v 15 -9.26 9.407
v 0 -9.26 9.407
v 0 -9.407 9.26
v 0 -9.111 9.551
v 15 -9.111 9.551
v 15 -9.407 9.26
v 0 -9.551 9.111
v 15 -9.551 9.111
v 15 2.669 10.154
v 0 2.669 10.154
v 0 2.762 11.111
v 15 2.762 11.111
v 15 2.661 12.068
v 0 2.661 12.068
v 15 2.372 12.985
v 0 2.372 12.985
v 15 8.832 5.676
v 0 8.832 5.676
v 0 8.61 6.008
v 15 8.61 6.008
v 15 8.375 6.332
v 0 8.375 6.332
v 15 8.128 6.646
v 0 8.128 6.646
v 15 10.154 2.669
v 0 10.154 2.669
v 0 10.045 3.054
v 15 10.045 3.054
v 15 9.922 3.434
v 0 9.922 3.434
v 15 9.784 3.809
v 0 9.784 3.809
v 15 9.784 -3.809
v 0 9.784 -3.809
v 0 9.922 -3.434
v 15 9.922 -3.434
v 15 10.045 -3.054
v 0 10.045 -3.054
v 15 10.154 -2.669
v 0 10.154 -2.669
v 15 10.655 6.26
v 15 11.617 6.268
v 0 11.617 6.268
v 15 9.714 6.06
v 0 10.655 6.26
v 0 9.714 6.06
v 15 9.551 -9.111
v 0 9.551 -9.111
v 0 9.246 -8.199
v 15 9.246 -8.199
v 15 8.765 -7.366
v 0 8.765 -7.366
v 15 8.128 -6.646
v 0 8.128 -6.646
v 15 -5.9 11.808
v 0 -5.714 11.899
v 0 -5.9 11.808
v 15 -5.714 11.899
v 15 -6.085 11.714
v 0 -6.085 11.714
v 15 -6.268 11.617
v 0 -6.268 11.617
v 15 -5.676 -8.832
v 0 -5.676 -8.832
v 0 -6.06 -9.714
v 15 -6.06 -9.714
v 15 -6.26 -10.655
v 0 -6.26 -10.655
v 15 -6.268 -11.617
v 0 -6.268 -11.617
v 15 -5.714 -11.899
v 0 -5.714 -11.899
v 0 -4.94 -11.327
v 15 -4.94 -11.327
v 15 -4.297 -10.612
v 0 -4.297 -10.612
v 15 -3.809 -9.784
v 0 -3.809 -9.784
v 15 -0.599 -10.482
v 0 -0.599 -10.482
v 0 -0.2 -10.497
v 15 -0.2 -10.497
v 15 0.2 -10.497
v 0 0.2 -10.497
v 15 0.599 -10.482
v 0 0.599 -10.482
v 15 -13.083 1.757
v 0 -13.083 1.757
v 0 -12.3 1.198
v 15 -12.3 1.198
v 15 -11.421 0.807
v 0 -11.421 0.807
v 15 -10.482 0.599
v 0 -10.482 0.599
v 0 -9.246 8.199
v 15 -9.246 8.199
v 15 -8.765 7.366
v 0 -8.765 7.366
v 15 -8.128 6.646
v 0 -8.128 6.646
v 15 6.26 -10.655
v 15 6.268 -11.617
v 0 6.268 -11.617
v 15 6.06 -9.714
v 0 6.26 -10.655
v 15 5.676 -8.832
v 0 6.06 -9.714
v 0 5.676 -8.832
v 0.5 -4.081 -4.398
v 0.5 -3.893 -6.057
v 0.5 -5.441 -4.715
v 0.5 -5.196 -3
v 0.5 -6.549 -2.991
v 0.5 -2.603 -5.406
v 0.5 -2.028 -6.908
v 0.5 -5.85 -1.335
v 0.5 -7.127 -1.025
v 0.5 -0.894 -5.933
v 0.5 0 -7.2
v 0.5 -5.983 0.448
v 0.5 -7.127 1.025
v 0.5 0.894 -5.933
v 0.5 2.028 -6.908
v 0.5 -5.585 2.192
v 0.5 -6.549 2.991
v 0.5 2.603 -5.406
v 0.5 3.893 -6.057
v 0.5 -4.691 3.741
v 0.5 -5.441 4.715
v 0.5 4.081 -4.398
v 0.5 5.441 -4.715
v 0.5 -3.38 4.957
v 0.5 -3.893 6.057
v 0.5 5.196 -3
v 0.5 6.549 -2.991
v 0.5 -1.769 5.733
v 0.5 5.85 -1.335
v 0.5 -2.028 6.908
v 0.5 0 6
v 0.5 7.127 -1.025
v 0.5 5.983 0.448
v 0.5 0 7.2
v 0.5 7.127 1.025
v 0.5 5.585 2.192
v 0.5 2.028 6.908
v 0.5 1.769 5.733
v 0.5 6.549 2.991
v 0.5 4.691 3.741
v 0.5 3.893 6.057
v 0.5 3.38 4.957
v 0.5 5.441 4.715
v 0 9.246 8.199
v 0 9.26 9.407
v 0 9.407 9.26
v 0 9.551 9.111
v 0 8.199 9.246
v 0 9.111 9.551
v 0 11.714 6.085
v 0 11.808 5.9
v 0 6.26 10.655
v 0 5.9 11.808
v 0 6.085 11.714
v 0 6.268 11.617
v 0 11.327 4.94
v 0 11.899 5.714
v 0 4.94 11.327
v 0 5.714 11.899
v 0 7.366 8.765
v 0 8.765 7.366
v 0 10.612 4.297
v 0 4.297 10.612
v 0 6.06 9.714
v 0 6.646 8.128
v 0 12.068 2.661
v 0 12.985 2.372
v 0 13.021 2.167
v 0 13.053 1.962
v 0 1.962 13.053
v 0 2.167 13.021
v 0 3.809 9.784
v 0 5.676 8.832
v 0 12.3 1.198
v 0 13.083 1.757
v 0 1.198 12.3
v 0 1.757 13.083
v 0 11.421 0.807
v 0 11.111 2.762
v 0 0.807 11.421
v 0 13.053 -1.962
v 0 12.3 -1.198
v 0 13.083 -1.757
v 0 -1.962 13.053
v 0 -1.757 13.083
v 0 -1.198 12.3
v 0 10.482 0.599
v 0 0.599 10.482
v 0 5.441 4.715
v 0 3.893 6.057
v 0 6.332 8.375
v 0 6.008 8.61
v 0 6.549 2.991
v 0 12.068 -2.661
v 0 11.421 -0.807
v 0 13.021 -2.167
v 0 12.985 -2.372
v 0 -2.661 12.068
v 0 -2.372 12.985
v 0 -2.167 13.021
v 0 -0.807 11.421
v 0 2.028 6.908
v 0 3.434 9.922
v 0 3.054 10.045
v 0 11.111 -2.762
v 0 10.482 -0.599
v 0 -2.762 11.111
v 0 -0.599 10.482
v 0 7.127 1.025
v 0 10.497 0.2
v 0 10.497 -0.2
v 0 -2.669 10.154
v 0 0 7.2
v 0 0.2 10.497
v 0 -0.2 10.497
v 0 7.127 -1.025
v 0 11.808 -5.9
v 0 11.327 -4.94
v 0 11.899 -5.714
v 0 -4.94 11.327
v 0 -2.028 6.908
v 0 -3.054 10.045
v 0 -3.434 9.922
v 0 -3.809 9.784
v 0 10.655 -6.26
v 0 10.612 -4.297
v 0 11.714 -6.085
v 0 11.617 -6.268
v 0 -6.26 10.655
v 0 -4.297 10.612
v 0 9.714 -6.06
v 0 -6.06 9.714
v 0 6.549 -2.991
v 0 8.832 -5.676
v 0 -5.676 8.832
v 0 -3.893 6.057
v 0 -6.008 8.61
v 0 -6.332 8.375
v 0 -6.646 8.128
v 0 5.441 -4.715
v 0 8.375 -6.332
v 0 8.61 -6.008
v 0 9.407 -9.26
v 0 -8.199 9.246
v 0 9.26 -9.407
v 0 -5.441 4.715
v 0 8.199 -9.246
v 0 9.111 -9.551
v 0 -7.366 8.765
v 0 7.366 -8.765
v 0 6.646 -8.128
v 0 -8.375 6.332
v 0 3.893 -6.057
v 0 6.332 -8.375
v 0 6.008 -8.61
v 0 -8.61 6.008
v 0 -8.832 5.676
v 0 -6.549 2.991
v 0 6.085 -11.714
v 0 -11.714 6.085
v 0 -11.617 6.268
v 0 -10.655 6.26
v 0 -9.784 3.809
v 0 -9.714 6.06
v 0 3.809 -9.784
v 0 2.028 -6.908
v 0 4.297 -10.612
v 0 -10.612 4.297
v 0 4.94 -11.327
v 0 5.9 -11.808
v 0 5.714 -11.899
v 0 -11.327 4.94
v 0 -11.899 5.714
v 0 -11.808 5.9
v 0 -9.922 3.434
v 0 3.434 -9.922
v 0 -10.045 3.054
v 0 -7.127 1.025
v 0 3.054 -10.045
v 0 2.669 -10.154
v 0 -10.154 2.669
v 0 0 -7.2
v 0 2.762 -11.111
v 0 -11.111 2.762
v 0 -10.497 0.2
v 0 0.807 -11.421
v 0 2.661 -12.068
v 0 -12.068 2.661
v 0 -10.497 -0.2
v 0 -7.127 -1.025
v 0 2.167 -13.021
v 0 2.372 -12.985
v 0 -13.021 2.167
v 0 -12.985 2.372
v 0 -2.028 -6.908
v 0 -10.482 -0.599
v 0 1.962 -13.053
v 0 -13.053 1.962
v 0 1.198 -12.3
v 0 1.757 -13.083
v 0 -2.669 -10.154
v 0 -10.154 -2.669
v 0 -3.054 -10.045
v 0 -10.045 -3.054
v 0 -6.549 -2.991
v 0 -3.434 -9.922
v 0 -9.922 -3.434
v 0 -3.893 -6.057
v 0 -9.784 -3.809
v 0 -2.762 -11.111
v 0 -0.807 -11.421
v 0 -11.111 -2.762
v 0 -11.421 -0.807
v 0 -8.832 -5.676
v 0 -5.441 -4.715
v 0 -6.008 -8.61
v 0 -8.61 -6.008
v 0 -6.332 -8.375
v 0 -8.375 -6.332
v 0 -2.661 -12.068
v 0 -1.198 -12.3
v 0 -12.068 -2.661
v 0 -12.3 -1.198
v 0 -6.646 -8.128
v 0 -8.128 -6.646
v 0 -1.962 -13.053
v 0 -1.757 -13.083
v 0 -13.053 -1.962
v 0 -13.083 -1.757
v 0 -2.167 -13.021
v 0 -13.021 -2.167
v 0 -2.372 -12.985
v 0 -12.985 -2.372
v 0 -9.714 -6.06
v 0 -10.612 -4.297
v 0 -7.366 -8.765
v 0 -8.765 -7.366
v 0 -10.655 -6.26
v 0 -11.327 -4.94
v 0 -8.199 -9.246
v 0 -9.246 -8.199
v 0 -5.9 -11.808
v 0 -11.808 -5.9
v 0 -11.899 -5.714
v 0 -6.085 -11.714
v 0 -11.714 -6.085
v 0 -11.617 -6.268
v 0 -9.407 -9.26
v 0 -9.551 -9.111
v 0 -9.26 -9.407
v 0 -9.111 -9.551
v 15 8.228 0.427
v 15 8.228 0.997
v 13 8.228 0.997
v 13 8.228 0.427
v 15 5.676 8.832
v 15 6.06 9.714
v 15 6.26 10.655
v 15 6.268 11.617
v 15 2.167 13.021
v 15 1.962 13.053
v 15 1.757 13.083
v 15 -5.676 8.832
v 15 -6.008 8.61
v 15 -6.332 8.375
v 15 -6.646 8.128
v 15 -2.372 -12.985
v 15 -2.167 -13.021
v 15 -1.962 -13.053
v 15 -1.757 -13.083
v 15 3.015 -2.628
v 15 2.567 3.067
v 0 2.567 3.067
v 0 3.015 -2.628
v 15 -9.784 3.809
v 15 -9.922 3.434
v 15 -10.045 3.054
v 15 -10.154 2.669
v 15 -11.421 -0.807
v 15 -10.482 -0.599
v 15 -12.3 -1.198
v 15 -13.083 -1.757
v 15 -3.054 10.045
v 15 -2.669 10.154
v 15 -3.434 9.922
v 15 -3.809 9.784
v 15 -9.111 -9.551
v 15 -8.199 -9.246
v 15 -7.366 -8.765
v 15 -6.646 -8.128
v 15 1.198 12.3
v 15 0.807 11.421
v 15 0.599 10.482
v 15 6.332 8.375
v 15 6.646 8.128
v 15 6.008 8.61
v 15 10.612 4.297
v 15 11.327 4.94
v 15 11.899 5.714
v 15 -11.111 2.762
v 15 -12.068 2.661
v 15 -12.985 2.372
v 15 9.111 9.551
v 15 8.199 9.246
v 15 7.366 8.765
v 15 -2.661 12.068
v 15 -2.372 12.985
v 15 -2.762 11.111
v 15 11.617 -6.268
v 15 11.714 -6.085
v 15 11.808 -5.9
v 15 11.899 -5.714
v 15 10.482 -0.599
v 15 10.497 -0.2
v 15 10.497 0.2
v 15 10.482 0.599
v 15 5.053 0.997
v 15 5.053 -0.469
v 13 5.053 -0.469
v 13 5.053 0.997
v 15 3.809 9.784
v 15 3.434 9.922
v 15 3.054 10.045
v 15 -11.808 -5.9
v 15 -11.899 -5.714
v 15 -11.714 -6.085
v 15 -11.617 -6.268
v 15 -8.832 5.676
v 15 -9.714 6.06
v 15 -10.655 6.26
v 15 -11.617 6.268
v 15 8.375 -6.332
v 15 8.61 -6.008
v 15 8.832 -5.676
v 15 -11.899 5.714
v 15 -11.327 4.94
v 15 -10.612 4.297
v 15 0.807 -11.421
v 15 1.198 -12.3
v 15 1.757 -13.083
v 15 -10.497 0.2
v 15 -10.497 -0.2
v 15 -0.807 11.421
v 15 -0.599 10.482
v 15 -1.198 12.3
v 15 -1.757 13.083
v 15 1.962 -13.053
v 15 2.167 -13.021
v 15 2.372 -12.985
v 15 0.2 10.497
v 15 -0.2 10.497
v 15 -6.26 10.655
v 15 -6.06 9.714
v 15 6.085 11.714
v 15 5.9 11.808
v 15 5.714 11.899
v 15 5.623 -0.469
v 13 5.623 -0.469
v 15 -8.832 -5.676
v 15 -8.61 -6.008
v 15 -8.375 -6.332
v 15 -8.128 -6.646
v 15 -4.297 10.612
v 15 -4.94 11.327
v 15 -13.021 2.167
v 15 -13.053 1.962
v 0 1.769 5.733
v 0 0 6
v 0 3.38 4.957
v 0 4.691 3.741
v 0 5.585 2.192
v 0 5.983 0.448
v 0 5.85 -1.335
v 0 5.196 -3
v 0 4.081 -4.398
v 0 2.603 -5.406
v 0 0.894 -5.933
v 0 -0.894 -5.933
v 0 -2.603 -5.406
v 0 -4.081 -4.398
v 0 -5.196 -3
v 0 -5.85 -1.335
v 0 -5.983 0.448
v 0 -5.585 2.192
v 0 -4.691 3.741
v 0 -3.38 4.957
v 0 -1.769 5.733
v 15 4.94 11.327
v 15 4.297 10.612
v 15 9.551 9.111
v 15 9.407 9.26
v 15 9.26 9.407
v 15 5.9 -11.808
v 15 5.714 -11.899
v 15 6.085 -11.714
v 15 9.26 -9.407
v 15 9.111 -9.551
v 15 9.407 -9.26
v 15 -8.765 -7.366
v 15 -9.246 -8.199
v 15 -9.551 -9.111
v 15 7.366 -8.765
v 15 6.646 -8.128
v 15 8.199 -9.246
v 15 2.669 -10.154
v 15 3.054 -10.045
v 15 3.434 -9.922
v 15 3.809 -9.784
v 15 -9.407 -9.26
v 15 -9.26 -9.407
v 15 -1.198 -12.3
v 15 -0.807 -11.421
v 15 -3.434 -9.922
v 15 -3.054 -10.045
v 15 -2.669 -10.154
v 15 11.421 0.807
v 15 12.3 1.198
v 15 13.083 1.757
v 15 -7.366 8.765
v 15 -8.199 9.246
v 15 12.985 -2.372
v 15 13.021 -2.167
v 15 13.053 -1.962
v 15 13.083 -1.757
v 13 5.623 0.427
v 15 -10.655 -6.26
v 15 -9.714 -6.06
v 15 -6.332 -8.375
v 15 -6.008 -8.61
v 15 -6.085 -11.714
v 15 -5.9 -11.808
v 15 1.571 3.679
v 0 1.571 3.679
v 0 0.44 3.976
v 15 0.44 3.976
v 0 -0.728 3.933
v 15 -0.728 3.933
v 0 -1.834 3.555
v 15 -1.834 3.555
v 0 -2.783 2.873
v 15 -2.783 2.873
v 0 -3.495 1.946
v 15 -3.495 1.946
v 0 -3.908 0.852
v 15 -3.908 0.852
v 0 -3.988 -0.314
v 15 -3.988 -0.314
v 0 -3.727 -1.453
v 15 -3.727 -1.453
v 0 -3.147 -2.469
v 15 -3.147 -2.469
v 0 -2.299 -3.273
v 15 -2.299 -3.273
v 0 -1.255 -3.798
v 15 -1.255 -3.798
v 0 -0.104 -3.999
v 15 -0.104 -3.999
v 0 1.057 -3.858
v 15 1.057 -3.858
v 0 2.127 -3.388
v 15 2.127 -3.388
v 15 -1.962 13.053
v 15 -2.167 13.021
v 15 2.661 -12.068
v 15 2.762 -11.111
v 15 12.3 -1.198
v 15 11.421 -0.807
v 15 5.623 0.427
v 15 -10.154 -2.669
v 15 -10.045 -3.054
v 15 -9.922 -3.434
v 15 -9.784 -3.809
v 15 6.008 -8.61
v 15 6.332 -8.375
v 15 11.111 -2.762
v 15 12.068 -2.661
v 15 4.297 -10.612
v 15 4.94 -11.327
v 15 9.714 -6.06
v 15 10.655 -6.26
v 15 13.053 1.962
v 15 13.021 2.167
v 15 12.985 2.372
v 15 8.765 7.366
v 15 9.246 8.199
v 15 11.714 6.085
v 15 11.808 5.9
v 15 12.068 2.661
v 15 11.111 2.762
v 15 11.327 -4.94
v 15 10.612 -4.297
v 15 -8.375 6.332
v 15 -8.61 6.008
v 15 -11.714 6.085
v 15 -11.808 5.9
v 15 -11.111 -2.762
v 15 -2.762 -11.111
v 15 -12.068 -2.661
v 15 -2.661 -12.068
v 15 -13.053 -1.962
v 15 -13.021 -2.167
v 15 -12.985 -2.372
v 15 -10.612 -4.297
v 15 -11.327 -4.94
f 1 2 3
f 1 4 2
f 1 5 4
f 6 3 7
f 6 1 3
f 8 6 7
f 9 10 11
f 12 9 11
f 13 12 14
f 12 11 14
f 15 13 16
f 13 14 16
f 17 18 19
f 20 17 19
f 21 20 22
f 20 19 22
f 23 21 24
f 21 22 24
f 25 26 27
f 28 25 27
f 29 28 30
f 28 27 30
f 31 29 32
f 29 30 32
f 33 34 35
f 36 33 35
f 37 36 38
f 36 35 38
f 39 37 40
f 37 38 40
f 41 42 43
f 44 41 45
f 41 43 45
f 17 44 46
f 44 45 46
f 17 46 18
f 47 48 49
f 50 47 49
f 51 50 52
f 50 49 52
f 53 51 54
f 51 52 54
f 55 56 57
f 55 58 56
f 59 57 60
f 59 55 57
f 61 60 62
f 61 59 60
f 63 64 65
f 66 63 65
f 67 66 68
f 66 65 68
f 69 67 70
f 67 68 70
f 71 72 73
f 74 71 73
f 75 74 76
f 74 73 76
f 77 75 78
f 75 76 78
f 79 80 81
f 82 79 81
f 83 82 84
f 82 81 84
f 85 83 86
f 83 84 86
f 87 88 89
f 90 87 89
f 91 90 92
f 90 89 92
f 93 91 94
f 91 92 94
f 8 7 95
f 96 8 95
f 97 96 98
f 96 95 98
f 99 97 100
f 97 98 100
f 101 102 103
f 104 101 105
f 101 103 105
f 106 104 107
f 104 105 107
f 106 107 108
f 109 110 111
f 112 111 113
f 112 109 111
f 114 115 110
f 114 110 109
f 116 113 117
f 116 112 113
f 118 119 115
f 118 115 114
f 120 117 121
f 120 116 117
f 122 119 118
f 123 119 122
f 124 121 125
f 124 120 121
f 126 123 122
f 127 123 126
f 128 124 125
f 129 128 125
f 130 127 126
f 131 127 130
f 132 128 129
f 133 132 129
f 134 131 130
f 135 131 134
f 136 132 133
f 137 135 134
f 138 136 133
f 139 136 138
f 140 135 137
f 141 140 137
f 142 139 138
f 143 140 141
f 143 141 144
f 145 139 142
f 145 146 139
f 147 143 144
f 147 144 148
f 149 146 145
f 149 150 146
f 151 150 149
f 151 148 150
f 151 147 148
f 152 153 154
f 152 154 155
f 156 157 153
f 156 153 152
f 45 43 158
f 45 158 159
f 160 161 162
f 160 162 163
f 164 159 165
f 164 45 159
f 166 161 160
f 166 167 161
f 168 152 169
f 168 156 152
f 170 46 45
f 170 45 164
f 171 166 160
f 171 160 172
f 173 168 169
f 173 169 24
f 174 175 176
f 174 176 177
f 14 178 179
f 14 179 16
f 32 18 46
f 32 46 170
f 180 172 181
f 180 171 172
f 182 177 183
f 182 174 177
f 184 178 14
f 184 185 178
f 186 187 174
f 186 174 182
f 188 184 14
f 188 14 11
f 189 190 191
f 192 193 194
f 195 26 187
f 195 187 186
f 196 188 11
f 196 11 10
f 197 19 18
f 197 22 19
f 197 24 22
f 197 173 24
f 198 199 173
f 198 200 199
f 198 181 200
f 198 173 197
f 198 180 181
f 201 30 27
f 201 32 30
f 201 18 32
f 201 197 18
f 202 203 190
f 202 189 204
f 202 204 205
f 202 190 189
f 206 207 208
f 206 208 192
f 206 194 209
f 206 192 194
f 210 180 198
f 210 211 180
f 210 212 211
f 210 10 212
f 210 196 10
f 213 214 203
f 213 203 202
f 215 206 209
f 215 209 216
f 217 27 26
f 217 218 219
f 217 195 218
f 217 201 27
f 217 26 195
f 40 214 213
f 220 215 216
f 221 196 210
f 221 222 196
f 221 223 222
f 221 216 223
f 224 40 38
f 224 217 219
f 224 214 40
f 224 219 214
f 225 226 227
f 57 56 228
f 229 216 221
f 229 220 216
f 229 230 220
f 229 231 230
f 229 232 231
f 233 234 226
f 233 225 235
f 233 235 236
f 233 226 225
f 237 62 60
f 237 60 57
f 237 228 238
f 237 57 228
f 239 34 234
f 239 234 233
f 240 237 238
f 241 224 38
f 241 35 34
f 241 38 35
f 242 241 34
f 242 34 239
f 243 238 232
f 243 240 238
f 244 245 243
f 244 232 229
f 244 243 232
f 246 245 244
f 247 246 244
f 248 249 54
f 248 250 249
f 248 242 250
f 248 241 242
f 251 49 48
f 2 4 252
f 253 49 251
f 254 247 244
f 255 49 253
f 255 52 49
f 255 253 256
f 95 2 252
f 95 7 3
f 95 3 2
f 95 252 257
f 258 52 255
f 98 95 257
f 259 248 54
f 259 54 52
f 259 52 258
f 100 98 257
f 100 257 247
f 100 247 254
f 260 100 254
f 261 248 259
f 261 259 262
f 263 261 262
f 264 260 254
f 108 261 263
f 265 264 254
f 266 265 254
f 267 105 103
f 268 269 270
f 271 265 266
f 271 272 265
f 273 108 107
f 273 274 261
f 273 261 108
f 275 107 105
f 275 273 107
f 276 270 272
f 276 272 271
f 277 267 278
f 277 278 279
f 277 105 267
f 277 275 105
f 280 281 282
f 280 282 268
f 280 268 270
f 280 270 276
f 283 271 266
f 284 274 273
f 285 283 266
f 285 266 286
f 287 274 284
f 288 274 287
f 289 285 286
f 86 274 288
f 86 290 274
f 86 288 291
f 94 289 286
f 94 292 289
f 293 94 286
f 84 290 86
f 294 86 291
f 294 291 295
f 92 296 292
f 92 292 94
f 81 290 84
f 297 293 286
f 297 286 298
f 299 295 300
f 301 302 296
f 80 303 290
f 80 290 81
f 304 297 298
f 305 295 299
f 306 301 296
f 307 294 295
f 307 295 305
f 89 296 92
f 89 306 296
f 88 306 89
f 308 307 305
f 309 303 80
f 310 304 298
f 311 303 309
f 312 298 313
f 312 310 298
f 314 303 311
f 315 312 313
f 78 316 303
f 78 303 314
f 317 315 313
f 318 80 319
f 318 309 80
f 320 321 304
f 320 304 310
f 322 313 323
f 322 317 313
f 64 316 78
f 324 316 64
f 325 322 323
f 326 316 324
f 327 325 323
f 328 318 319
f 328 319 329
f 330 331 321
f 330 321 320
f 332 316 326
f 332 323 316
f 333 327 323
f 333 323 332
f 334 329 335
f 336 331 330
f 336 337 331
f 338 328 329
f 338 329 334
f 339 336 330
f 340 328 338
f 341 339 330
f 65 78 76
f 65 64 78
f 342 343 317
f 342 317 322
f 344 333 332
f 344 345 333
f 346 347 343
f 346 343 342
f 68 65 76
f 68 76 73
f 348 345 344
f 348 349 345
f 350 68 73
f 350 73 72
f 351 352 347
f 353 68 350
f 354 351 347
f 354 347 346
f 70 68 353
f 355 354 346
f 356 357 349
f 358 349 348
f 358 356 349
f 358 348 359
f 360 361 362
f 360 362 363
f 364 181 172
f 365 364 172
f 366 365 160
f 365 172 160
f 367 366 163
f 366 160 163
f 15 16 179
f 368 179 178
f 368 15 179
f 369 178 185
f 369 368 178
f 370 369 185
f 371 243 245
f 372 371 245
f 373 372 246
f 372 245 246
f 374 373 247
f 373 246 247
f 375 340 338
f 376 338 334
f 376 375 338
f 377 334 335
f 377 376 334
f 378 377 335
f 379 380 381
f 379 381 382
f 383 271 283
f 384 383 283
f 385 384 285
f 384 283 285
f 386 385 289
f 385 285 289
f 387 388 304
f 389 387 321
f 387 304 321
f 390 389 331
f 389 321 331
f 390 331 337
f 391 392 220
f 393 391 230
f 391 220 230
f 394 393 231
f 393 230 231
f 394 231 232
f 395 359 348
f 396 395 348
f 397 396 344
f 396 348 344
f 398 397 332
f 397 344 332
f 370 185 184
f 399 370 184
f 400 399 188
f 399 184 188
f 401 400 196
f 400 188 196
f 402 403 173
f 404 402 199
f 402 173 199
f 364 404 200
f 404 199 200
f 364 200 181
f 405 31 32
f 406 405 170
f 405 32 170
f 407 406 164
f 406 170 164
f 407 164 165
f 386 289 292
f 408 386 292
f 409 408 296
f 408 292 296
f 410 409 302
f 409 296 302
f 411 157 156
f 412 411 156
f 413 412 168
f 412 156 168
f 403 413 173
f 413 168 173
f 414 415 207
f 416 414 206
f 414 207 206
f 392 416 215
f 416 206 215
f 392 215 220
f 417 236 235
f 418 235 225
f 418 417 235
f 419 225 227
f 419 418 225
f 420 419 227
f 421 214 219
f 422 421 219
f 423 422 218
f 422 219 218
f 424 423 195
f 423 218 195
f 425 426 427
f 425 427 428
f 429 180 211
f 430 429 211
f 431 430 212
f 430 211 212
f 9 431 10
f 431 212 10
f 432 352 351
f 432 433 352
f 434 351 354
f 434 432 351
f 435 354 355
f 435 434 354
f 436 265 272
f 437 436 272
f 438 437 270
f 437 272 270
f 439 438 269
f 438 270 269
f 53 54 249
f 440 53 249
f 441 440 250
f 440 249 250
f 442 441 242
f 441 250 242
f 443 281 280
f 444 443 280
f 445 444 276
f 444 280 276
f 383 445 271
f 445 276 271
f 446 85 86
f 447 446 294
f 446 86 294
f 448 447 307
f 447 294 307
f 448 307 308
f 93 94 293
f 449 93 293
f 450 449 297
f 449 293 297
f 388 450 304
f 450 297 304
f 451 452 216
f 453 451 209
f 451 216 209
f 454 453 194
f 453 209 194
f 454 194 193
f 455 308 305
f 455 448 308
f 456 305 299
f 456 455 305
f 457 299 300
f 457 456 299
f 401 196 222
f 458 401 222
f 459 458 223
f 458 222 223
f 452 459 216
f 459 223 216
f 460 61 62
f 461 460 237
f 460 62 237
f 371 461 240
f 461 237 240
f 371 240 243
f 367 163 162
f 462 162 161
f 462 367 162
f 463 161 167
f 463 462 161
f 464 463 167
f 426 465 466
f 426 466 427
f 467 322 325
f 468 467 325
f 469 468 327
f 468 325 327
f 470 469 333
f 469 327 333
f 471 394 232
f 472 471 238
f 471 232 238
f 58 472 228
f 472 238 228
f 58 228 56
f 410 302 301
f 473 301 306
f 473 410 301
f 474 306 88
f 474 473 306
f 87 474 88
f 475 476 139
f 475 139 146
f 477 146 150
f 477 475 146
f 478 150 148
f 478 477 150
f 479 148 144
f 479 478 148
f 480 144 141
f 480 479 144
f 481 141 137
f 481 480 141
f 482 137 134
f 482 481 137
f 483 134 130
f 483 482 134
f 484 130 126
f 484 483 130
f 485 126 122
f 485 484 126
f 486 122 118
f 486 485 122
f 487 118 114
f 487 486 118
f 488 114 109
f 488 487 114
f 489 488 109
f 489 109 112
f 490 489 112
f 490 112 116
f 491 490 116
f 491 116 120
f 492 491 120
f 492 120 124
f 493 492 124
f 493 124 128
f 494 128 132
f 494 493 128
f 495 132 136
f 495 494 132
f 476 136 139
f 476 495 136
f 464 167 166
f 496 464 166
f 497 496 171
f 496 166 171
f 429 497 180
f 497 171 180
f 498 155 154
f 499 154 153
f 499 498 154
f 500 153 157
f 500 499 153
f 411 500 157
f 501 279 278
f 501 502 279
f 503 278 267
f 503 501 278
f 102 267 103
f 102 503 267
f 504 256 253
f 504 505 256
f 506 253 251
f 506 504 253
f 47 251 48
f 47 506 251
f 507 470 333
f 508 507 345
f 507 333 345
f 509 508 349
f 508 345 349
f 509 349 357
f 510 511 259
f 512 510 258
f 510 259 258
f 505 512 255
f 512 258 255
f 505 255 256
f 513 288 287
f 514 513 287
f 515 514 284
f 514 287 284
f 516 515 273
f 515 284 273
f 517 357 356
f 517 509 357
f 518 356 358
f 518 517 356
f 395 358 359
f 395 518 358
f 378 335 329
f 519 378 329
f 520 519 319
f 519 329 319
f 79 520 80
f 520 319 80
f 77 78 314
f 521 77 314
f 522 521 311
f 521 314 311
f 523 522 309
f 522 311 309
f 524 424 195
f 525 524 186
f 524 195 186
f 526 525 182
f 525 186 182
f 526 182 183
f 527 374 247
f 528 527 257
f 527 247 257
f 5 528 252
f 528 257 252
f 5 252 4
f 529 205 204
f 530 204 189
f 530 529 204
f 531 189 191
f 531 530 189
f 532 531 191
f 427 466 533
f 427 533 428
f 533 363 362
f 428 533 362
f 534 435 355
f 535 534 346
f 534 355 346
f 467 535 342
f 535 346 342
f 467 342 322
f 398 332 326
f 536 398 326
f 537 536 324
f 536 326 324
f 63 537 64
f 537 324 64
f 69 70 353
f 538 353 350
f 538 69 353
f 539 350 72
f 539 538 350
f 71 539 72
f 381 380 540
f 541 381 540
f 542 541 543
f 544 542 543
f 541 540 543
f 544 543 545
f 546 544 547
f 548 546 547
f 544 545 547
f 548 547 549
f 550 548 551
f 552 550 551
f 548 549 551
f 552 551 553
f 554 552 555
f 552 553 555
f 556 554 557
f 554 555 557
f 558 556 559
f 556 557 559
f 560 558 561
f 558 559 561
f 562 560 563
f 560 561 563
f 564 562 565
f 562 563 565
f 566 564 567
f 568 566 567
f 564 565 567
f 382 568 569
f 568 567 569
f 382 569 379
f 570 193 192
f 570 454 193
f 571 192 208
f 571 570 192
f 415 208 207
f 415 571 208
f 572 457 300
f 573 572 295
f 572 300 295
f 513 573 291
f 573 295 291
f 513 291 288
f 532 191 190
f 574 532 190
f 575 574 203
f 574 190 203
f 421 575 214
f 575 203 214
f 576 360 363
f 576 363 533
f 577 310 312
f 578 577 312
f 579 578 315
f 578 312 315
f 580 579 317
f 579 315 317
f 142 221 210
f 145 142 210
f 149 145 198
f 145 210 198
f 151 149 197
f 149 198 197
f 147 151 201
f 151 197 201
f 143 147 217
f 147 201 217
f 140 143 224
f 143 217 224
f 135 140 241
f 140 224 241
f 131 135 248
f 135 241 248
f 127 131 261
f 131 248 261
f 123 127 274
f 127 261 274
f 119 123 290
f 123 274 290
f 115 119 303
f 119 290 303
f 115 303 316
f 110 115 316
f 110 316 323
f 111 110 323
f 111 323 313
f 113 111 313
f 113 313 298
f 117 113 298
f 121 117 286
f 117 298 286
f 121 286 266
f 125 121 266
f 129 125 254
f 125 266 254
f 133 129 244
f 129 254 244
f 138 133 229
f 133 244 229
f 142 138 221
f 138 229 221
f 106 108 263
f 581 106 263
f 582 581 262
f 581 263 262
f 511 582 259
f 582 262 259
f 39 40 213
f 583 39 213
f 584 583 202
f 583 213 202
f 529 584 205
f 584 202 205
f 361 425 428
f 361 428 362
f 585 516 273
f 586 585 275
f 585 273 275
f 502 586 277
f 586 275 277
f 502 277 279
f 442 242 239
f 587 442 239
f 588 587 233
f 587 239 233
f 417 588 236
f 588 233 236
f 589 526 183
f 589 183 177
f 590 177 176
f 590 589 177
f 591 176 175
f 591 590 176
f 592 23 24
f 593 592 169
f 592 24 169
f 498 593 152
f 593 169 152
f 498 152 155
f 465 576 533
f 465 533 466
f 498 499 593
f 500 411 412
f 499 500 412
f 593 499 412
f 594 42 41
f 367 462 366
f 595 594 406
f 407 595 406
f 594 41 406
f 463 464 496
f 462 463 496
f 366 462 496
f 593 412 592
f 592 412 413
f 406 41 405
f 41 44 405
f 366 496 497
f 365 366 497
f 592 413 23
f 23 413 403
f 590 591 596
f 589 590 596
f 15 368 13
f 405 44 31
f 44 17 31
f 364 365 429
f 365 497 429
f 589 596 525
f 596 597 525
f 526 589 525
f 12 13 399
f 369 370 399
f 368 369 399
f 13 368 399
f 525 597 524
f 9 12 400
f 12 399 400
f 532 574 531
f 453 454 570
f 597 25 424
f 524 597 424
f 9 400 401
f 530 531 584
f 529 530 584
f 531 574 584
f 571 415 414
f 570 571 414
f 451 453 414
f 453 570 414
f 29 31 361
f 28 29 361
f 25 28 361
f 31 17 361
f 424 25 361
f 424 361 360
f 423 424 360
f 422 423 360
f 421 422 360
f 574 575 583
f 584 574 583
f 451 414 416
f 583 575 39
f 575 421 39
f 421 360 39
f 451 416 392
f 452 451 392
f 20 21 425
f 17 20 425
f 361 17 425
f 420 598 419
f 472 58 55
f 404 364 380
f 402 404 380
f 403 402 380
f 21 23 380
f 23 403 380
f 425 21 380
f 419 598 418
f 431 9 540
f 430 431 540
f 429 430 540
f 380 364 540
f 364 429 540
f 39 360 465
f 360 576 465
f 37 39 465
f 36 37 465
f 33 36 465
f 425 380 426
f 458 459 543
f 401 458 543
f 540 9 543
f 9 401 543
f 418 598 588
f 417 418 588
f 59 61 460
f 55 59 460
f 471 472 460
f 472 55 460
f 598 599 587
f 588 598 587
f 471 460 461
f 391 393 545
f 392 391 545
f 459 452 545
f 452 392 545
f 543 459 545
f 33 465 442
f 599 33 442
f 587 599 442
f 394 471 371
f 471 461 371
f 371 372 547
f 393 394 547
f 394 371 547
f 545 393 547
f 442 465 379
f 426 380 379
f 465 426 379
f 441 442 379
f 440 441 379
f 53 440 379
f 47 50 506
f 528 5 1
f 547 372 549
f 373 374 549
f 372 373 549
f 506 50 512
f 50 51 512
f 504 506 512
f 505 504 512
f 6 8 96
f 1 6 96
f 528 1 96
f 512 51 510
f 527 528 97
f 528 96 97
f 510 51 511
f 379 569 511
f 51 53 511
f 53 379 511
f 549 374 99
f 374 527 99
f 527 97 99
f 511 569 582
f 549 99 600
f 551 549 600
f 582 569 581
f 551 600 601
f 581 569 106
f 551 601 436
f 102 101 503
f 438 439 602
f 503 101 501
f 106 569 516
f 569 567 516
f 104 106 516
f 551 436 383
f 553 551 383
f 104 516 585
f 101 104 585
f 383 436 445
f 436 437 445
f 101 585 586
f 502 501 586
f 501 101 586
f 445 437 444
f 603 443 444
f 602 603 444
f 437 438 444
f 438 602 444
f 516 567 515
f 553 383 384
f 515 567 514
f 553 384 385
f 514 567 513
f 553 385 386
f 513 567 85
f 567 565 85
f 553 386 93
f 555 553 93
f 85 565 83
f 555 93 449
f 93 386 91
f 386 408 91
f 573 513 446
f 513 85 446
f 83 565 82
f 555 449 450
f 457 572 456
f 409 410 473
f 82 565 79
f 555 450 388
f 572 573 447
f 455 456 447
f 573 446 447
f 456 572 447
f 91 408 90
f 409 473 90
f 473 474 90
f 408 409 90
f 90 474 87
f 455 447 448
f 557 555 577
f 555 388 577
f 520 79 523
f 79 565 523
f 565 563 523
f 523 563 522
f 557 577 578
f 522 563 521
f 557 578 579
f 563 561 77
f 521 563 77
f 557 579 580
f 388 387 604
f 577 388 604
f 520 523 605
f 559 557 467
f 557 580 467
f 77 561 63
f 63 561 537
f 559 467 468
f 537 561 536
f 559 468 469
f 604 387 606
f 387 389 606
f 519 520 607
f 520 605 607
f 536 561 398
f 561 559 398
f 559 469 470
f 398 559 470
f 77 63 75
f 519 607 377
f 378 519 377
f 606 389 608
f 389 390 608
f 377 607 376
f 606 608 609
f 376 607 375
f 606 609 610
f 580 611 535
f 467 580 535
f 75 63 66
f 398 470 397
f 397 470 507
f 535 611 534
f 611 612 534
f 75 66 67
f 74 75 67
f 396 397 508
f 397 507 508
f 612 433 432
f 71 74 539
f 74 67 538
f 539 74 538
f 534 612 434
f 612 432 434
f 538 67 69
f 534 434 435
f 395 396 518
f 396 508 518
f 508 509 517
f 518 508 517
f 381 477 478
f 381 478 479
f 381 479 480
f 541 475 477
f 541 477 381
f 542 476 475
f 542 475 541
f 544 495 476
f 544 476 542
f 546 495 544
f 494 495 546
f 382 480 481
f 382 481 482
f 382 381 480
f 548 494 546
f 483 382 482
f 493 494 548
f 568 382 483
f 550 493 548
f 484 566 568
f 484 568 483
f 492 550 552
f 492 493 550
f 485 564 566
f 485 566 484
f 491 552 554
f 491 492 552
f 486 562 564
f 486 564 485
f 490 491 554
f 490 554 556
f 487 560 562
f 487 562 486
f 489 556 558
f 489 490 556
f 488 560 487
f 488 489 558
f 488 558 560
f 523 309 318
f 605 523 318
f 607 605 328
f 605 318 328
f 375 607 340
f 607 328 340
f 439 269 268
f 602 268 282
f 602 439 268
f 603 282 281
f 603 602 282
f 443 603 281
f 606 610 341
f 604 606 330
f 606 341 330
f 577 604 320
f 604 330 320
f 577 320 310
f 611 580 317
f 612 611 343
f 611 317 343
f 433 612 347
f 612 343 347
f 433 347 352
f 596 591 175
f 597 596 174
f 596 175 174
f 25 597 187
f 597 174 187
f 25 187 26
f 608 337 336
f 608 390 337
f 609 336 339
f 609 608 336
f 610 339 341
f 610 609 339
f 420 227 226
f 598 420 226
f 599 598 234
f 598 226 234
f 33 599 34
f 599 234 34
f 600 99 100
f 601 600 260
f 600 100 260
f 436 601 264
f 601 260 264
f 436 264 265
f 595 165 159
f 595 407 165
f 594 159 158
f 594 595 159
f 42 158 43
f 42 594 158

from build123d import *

# Parameters (mm, degrees)
BASPROSKE_W         = 15
BASPROSKE_H         = 13.2
TOOTHCUT_DEPTH      = 24.947442452
TEETHCUTS_COUNT     = 20
TEETHCUTS_ANGLE     = 342
BORSKE_R            = 4
BORE_DEPTH          = 50.0000508
BOSS_EXTRUDE1_START = -15
BOSS_EXTRUDE1_DEPTH = 15
SKETCH2_R           = 7.2
SKETCH2_R_2         = 6
CUT_EXTRUDE1_DEPTH  = 0.5
CUT_EXTRUDE2_DEPTH  = 2


with BuildPart() as part:
    # BasProSke → Base-Revolve (revolve)
    with BuildSketch(Plane(origin=(0, 0, 0), x_dir=(1, 0, 0), z_dir=(0, 1, 0)), mode=Mode.PRIVATE) as base_revolve_sk:
        with Locations((7.5, 6.6)):
            Rectangle(BASPROSKE_W, BASPROSKE_H)
    revolve(base_revolve_sk.sketch.rotate(Axis((-10, 0, 0), (1, 0, 0)), 180), axis=Axis((-10, 0, 0), (1, 0, 0)))

    # TooCutSke → ToothCut (cut, through all)
    with BuildSketch(Plane(origin=(0, 0, 0), x_dir=(0, 0, -1), z_dir=(1, 0, 0))):
        with BuildLine():
            ThreePointArc((0.599012827, 10.48189795), (0, 10.499), (-0.599012827, 10.48189795))
            ThreePointArc((-0.599012827, 10.48189795), (-0.986906343, 11.883983562), (-1.777012823, 13.105473306))
            ThreePointArc((-1.777012823, 13.105473306), (0, 13.2254), (1.777012823, 13.105473306))
            ThreePointArc((1.777012823, 13.105473306), (0.986906343, 11.883983562), (0.599012827, 10.48189795))
        make_face()
    toothcut = extrude(amount=TOOTHCUT_DEPTH, mode=Mode.SUBTRACT)

    # TeethCuts: ToothCut ×20 about axis
    teethcuts_axis = Axis((-10, 0, 0), (1, 0, 0))
    for i in range(1, TEETHCUTS_COUNT):
        add(toothcut.rotate(teethcuts_axis, i * TEETHCUTS_ANGLE / (TEETHCUTS_COUNT - 1)), mode=Mode.SUBTRACT)

    # BorSke → Bore (cut, symmetric)
    with BuildSketch(Plane(origin=(0, 0, 0), x_dir=(0, 0, -1), z_dir=(1, 0, 0))):
        with Locations(Location((0, 0, 0), (0, 0, 180))):
            Circle(BORSKE_R)
    extrude(amount=BORE_DEPTH, both=True, mode=Mode.SUBTRACT)

    # Sketch1 → Boss-Extrude1 (add)
    with BuildSketch(Plane.ZY.offset(BOSS_EXTRUDE1_START)):
        with BuildLine():
            Line((3.067450983, 2.567244528), (-2.628080047, 3.015492541))
            ThreePointArc((-2.628080047, 3.015492541), (0.313836383, 3.987669335), (3.067450983, 2.567244528))
        make_face()
    extrude(amount=BOSS_EXTRUDE1_DEPTH)

    # Sketch2 → Cut-Extrude1 (cut)
    with BuildSketch(Plane.ZY):
        Circle(SKETCH2_R)
        Circle(SKETCH2_R_2, mode=Mode.SUBTRACT)
    extrude(amount=-CUT_EXTRUDE1_DEPTH, mode=Mode.SUBTRACT)

    # Sketch3 → Cut-Extrude2 (cut)
    with BuildSketch(Plane(origin=(15, 0, 0), x_dir=(0, 0, -1), z_dir=(1, 0, 0))):
        Polygon((-0.996764222, 8.228081038), (-0.426892427, 8.228081038), (-0.426892427, 5.622952833), (0.468620394, 5.622952833), (0.468620394, 5.053081038), (-0.996764222, 5.053081038), align=None)
    extrude(amount=-CUT_EXTRUDE2_DEPTH, mode=Mode.SUBTRACT)


solid = part.part
